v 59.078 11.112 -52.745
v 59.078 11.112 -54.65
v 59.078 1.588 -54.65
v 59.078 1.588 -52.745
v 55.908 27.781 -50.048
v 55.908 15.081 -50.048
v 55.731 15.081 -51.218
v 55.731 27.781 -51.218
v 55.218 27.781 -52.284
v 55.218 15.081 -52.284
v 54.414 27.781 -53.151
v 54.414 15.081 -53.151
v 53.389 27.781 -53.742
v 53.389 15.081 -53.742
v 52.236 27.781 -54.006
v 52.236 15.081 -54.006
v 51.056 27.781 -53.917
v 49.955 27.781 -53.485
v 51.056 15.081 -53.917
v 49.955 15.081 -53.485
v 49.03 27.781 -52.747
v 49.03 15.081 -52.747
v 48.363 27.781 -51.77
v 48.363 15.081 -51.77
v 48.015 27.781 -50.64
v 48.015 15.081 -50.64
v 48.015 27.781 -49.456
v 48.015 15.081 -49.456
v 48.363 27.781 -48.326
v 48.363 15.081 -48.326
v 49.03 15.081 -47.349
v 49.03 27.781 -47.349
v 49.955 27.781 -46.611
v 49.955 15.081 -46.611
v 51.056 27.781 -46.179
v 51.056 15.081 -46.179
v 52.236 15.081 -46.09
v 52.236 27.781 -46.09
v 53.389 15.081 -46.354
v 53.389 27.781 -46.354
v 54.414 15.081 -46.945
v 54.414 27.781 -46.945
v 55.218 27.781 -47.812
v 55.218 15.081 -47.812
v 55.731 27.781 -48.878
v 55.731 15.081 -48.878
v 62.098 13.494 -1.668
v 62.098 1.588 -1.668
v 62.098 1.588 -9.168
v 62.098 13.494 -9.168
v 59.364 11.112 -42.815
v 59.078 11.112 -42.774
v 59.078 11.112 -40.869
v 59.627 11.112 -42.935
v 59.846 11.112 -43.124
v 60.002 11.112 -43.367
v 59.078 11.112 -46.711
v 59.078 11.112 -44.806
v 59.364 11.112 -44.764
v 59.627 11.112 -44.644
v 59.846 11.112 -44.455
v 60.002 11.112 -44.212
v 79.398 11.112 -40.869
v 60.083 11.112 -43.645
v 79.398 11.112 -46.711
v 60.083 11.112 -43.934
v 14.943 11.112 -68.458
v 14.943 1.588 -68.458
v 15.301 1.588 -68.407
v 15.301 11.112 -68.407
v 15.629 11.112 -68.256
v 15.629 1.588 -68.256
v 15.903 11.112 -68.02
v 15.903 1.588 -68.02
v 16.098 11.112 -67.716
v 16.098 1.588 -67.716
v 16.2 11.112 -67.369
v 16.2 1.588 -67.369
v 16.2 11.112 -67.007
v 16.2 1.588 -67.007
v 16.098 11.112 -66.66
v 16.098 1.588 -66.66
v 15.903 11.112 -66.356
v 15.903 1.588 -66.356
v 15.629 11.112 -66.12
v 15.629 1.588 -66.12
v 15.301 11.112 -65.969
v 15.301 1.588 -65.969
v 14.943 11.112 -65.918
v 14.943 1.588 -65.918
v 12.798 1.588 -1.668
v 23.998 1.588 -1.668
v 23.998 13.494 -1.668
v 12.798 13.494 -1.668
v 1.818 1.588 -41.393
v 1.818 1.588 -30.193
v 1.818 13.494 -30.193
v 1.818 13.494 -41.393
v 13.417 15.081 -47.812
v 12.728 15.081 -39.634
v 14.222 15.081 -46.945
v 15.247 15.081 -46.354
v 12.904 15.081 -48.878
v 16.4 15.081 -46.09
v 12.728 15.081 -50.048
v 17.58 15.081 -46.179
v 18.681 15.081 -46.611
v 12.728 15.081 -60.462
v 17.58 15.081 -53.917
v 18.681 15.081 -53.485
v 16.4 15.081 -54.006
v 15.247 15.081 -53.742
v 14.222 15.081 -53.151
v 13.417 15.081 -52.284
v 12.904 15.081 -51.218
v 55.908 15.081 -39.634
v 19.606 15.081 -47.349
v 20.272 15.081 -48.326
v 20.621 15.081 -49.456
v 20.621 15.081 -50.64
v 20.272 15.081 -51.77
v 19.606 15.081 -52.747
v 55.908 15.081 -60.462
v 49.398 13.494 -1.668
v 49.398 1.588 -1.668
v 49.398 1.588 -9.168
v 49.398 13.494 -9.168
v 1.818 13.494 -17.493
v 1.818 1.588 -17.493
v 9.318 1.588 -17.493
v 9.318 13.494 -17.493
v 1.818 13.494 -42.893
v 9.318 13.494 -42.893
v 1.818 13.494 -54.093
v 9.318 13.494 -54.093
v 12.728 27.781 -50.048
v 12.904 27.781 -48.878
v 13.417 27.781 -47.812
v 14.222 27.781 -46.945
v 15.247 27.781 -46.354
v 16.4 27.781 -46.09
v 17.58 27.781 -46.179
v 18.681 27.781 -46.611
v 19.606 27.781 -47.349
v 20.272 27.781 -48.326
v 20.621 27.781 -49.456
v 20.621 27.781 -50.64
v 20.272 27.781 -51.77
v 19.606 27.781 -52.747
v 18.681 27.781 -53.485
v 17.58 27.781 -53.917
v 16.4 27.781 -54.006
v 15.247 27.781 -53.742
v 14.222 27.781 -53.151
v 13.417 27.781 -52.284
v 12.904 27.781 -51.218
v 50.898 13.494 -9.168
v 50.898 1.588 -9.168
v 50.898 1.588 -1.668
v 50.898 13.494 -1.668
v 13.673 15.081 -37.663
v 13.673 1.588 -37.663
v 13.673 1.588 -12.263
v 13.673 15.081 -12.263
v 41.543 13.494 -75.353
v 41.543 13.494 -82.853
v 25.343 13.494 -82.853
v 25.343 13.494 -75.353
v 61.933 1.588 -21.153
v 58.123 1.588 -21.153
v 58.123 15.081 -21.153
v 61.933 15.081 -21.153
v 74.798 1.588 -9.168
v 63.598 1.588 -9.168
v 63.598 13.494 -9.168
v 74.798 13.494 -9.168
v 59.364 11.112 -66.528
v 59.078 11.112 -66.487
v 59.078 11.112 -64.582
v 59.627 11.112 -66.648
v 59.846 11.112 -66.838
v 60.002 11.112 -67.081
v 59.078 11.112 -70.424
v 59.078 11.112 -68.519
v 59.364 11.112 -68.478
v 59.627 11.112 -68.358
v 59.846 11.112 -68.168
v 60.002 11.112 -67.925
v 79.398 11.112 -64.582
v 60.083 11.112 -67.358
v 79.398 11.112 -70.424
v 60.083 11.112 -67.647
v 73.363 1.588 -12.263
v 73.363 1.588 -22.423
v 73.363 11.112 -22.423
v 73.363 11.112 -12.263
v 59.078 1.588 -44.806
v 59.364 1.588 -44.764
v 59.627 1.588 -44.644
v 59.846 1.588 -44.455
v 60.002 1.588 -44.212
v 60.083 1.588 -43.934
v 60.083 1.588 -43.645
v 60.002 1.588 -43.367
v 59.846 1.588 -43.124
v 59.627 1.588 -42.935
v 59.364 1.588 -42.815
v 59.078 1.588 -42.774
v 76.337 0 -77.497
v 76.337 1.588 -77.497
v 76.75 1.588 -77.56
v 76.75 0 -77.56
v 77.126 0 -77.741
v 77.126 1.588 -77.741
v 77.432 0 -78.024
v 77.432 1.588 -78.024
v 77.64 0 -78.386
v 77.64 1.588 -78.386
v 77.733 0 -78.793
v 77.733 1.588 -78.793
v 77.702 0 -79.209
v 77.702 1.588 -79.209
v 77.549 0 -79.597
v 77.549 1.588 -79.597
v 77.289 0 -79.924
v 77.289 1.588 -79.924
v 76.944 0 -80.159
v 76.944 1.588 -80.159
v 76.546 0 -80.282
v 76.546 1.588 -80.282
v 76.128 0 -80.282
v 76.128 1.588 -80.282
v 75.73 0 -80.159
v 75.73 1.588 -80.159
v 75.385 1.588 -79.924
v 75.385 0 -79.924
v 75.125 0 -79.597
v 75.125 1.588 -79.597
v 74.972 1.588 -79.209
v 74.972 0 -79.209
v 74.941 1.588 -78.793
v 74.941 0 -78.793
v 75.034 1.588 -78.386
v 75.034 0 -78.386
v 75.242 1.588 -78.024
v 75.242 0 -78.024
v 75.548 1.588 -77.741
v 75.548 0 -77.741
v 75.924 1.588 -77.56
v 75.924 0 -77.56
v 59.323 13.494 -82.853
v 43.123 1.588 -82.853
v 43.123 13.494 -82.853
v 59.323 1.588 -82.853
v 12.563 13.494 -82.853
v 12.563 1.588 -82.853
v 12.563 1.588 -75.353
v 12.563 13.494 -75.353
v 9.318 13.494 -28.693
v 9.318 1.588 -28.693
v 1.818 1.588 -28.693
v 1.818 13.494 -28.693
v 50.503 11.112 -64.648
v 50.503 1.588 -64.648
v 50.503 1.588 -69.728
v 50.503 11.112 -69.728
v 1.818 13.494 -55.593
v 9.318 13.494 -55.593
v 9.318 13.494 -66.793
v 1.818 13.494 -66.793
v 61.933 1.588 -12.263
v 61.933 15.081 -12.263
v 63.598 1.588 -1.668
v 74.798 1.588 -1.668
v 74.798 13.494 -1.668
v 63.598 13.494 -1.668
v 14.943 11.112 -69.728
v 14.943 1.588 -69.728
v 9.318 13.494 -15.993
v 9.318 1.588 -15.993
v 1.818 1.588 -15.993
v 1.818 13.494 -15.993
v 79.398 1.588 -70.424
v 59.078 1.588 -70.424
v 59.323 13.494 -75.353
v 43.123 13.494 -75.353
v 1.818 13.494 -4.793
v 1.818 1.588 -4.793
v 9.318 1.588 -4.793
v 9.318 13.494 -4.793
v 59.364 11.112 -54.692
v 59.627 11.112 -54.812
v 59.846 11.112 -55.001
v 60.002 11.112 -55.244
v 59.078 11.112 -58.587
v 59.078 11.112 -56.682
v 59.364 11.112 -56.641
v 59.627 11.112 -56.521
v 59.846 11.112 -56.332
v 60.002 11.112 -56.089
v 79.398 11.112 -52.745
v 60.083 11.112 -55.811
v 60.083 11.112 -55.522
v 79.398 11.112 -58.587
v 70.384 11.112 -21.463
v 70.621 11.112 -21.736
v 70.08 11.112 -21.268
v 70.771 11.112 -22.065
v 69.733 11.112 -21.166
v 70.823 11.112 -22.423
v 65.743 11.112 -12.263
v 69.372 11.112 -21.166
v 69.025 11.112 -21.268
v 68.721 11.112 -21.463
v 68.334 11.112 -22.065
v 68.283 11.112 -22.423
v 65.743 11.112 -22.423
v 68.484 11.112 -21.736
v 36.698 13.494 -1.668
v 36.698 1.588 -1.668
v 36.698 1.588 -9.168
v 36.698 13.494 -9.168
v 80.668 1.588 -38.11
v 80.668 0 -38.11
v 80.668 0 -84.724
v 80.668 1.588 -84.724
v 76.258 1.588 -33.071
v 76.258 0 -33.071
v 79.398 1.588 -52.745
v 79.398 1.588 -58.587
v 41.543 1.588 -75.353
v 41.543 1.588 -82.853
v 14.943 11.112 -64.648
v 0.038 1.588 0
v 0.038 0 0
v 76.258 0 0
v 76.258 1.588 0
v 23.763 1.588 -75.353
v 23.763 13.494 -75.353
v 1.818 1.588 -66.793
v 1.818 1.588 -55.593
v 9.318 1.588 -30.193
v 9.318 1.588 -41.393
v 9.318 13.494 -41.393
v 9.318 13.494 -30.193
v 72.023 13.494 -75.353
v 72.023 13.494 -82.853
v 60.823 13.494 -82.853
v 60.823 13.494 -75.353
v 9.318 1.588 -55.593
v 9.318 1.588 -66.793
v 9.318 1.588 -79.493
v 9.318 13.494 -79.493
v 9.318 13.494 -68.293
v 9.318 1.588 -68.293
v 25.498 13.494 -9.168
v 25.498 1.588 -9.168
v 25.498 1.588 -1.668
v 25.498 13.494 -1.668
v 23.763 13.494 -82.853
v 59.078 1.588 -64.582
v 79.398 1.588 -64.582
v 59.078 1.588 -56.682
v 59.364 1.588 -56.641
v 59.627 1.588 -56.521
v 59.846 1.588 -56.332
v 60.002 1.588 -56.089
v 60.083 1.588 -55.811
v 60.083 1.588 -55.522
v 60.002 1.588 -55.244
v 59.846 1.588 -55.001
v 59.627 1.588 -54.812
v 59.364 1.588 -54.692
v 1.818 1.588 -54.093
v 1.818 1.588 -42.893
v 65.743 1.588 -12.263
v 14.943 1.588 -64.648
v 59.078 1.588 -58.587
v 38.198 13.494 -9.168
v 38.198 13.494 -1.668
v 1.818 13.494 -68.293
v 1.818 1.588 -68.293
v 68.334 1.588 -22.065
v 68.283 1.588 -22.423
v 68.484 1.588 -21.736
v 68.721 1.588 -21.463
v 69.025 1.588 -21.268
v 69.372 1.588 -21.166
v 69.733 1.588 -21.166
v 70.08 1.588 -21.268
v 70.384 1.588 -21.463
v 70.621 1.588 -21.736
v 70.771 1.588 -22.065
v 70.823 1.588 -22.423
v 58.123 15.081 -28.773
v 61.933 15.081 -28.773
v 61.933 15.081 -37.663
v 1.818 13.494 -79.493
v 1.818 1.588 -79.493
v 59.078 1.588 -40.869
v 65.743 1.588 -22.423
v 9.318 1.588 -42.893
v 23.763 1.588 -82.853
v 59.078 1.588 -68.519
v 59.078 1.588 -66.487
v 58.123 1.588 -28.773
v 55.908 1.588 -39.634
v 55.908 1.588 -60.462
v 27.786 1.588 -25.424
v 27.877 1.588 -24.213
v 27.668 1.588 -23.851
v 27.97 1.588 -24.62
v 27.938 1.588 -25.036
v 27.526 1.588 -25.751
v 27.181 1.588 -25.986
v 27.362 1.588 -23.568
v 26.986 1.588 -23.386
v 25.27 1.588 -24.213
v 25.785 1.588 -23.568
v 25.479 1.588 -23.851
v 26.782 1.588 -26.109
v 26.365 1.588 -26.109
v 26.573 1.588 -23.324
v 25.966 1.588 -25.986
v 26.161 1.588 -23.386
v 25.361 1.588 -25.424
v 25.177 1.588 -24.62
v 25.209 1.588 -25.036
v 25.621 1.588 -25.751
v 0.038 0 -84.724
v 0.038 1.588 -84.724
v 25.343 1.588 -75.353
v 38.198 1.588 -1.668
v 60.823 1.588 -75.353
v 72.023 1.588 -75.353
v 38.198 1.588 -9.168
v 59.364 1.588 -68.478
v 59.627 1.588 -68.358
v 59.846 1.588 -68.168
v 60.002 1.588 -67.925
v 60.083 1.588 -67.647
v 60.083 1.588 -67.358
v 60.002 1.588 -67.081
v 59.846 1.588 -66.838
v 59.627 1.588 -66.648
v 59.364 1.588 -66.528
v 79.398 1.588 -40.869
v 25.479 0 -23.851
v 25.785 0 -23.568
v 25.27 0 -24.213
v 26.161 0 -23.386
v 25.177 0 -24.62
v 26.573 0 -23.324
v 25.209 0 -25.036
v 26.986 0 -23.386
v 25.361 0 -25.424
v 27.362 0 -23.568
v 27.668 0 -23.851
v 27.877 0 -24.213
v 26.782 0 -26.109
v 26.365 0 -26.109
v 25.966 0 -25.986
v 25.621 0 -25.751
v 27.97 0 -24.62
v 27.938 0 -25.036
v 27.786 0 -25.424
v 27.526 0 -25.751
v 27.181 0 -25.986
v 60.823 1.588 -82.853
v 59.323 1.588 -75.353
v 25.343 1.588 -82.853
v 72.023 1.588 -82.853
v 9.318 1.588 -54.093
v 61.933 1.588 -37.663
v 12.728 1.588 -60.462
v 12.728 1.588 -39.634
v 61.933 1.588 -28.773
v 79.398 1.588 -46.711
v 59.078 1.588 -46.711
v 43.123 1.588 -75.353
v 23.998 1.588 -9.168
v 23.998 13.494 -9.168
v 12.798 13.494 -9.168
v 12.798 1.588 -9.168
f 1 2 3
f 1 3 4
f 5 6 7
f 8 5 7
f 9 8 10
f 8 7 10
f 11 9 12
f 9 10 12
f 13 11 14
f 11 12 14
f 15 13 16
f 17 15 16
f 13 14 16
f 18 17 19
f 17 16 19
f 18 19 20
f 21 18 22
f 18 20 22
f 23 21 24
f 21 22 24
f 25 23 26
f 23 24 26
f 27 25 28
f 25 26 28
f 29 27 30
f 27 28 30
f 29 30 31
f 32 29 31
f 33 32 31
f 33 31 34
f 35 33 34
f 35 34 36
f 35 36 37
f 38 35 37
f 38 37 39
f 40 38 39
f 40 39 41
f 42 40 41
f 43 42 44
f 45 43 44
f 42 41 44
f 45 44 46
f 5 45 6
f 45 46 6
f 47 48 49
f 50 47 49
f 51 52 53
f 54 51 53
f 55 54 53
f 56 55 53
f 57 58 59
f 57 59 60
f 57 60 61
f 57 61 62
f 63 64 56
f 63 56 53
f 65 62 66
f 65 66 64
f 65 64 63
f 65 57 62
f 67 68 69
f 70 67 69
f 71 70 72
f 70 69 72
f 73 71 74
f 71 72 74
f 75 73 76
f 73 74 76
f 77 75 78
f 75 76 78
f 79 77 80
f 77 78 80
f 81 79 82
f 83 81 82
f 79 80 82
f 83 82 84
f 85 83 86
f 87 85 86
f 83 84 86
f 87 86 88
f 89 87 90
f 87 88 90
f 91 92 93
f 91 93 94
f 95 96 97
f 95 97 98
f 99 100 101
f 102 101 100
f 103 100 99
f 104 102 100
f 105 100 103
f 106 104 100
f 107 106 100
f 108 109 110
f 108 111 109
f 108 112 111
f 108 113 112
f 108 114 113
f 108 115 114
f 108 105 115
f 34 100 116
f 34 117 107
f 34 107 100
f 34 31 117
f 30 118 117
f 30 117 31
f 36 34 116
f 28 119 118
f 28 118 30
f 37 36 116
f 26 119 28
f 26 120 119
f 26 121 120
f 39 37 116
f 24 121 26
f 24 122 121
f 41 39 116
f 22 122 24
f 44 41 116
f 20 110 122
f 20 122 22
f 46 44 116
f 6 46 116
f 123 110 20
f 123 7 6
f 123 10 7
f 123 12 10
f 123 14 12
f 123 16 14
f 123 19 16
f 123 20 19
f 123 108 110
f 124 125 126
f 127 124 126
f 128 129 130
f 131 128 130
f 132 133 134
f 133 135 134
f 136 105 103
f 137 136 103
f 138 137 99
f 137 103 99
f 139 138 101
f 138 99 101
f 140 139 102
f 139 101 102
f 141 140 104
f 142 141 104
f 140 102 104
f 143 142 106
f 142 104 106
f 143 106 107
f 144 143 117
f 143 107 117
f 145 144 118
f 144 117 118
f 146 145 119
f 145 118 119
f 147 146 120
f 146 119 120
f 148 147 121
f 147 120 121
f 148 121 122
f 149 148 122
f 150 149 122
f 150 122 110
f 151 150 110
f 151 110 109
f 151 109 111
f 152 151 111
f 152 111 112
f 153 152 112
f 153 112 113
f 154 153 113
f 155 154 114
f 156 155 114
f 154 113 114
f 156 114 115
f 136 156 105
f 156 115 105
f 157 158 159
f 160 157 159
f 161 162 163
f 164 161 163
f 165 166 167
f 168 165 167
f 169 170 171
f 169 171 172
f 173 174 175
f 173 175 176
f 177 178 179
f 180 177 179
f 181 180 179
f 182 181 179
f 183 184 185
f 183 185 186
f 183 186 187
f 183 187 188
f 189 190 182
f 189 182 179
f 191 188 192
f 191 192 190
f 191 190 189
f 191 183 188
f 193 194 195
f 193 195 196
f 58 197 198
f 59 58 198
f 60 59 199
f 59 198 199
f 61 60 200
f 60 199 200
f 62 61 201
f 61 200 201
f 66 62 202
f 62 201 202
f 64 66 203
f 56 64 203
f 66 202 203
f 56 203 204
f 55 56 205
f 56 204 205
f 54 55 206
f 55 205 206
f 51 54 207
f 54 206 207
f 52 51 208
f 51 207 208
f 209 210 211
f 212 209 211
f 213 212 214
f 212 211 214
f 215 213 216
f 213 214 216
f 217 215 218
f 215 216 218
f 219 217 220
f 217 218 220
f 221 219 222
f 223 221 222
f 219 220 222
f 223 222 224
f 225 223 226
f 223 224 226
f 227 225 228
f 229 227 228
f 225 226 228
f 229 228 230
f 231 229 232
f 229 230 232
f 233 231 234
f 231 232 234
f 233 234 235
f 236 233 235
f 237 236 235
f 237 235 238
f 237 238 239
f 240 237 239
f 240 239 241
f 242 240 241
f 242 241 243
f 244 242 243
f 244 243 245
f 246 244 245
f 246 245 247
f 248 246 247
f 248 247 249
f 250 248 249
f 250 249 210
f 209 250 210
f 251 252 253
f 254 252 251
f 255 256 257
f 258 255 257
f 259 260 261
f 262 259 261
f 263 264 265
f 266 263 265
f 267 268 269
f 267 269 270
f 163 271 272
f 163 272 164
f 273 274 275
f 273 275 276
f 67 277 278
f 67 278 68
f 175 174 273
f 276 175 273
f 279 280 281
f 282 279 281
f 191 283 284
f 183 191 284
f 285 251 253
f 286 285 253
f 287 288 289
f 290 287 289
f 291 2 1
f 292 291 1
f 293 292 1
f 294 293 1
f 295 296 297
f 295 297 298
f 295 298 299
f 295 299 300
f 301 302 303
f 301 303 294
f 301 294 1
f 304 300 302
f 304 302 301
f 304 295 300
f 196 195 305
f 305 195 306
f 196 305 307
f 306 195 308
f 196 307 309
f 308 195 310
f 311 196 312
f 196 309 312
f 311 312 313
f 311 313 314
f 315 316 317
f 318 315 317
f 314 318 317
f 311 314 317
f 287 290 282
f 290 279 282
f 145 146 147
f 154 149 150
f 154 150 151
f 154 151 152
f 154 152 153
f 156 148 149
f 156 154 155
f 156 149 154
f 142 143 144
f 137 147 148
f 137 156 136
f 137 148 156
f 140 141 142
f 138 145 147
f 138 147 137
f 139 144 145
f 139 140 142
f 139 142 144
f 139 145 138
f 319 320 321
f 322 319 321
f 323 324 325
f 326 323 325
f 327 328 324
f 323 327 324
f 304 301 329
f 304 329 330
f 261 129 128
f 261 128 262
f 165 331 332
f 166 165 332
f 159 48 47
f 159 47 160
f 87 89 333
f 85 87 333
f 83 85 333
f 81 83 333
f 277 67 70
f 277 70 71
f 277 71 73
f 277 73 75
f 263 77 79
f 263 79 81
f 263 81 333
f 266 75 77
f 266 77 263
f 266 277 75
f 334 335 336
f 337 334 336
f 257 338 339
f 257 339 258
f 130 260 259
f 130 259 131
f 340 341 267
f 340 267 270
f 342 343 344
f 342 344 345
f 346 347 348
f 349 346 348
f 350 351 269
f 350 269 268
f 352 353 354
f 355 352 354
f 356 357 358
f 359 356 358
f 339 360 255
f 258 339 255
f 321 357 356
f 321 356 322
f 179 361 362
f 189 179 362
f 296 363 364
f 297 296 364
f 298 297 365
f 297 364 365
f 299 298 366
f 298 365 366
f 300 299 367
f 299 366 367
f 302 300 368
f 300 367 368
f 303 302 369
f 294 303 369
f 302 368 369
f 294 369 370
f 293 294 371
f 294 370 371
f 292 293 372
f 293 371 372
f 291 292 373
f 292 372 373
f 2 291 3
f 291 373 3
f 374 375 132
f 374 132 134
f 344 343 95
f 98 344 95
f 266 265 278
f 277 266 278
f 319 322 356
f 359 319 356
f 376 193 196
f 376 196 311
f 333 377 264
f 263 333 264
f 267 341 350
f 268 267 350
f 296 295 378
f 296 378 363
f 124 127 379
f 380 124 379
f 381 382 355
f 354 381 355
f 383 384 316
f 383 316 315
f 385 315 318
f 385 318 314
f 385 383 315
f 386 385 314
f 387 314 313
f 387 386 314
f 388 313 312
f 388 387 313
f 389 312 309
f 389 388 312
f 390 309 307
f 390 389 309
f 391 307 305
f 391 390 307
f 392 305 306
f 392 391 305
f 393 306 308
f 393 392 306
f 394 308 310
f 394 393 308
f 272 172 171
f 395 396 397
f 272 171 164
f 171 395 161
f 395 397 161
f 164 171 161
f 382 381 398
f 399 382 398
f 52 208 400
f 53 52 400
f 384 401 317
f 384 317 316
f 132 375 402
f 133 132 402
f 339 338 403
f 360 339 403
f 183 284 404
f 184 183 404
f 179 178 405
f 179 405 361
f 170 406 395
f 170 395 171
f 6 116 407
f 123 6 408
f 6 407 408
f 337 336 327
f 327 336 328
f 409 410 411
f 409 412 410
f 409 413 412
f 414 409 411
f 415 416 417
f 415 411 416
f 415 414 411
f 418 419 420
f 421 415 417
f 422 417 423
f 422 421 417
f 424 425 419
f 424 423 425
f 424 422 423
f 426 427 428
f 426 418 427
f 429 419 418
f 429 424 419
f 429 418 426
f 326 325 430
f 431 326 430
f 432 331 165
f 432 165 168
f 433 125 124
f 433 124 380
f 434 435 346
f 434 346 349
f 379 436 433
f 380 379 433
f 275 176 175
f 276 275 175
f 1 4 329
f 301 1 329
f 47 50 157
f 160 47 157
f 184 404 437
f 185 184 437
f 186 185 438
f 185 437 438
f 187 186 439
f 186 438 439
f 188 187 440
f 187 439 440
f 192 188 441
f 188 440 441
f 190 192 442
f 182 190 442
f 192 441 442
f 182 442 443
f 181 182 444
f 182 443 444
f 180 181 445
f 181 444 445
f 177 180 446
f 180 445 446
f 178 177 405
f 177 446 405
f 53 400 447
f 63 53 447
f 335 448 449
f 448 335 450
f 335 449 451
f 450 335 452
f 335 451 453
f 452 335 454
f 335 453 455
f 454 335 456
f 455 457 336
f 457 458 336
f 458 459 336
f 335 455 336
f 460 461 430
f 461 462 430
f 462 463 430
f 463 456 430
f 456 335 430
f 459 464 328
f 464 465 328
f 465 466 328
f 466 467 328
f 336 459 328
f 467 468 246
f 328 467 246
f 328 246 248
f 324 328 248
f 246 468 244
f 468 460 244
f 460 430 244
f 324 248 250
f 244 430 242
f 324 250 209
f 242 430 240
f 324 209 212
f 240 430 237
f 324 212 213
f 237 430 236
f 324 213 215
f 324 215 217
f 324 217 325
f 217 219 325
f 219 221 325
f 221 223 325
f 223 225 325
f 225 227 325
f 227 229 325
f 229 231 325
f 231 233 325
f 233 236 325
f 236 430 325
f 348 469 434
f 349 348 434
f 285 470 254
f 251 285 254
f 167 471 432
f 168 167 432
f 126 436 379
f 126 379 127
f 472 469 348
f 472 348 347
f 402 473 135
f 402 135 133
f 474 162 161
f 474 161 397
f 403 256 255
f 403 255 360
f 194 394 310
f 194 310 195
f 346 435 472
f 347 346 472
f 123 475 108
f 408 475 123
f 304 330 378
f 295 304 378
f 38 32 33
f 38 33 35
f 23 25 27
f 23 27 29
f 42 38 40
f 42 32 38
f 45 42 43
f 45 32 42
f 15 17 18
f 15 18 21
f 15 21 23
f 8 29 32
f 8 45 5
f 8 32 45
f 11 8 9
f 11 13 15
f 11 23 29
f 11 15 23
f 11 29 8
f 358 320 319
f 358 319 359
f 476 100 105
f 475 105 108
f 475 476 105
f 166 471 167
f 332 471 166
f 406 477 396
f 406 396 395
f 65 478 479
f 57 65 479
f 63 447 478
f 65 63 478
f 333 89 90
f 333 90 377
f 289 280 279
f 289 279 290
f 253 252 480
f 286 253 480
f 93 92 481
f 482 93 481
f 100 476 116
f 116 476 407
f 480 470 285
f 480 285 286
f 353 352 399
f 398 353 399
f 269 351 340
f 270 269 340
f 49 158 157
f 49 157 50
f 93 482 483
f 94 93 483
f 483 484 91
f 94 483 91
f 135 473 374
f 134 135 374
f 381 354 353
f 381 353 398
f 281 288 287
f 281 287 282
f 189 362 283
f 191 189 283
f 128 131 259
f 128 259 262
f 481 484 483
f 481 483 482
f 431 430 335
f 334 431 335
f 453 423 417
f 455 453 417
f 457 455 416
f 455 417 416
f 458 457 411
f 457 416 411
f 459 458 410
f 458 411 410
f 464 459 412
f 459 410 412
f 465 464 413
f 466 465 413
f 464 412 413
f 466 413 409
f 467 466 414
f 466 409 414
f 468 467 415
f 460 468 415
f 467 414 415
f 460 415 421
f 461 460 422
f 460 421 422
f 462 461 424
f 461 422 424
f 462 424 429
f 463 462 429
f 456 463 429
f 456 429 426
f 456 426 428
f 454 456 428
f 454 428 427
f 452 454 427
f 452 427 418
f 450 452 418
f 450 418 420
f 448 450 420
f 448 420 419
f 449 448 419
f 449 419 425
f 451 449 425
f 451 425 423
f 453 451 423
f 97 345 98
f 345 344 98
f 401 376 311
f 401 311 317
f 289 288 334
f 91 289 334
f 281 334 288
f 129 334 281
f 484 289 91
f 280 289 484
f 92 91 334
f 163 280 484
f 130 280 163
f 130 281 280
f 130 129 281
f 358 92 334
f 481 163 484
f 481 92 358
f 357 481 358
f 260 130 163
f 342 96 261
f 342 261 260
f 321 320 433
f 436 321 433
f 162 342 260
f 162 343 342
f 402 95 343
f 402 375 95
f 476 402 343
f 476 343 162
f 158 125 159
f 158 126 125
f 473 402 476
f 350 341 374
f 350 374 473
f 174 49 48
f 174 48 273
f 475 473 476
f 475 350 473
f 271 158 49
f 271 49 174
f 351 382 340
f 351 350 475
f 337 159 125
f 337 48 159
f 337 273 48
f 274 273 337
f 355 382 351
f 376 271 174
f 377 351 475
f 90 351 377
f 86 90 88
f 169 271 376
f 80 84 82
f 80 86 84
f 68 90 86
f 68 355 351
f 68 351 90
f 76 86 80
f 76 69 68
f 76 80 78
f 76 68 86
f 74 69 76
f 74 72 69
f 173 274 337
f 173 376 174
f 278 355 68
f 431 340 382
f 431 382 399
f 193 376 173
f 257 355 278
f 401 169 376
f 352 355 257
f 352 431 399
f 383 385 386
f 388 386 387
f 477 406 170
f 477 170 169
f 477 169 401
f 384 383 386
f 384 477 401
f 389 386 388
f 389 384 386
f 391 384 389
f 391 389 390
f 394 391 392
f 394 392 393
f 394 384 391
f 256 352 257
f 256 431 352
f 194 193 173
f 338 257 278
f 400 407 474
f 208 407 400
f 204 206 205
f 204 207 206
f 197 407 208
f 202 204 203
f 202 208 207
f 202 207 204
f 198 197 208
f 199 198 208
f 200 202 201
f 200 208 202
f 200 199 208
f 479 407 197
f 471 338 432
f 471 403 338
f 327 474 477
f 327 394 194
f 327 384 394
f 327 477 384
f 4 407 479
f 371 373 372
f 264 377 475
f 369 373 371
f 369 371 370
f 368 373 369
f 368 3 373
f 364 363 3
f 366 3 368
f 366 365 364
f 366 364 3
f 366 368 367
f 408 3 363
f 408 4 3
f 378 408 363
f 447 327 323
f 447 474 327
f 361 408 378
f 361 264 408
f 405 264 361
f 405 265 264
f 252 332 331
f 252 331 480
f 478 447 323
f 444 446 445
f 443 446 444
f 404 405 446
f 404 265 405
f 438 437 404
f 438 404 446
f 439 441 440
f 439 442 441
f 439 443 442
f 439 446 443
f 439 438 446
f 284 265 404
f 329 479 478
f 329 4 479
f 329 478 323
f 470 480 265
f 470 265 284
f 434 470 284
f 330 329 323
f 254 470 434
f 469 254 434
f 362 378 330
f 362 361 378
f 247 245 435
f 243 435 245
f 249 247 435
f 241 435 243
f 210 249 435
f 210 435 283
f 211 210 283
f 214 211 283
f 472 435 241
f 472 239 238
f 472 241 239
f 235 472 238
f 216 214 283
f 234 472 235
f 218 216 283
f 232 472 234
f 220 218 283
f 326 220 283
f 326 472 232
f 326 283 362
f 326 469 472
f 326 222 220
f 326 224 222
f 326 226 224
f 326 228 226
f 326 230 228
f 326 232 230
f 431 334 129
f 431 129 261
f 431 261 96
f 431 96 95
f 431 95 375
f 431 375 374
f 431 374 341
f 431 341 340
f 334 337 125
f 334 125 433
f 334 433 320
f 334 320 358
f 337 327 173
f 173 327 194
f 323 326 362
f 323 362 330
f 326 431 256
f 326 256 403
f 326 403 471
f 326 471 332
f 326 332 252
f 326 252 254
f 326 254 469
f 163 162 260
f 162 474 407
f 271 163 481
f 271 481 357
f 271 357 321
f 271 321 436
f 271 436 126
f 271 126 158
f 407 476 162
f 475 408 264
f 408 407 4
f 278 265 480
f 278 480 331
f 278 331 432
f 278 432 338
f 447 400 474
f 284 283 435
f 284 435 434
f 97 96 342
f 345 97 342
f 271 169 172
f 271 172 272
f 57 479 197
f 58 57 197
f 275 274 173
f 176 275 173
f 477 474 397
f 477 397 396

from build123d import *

# Parameters (mm, degrees)
BOSS_EXTRUDE1_DEPTH = 1.5875
SKETCH2_R           = 1.3999972
CUT_EXTRUDE1_DEPTH  = 117.995510328
BOSS_EXTRUDE2_DEPTH = 11.90625
SKETCH4_W           = 43.17991364
SKETCH4_H           = 20.827958344
BOSS_EXTRUDE3_DEPTH = 13.49375
SKETCH6_R           = 3.96875
BOSS_EXTRUDE4_DEPTH = 12.7
BOSS_EXTRUDE5_DEPTH = 9.525


with BuildPart() as part:
    # Sketch1 → Boss-Extrude1 (new body)
    with BuildSketch(Plane(origin=(0, 0, 0), x_dir=(1, 0, 0), z_dir=(0, 1, 0))):
        Polygon((0.038099924, 84.724030552), (0.038099924, 0), (76.258247483, 0), (76.258247483, 33.070733858), (80.667638664, 38.11002378), (80.667638664, 84.724030552), align=None)
    extrude(amount=BOSS_EXTRUDE1_DEPTH)

    # Sketch2 → Cut-Extrude1 (cut, through all)
    with BuildSketch(Plane(origin=(0, 1.5875, 0), x_dir=(1, 0, 0), z_dir=(0, 1, 0))):
        with Locations((76.336947326, 78.897342205)):
            Circle(SKETCH2_R)
        with Locations((26.573446853, 24.724250551)):
            Circle(SKETCH2_R)
    extrude(amount=-CUT_EXTRUDE1_DEPTH, mode=Mode.SUBTRACT)

    # Sketch3 → Boss-Extrude2 (add)
    with BuildSketch(Plane(origin=(0, 1.5875, 0), x_dir=(1, 0, 0), z_dir=(0, 1, 0))):
        Polygon((60.822778354, 75.352649294), (60.822778354, 81.852636294), (60.822778354, 82.852634294), (72.022755954, 82.852634294), (72.022755954, 81.852636294), (72.022755954, 75.352649294), align=None)
        Polygon((59.322781354, 82.852634294), (59.322781354, 81.852636294), (59.322781354, 75.352649294), (43.122813754, 75.352649294), (43.122813754, 81.852636294), (43.122813754, 82.852634294), align=None)
        Polygon((25.342849314, 75.352649294), (25.342849314, 81.852636294), (25.342849314, 82.852634294), (41.542816914, 82.852634294), (41.542816914, 81.852636294), (41.542816914, 75.352649294), align=None)
        Polygon((63.597672804, 1.668196664), (63.597672804, 2.668194664), (63.597672804, 9.168181664), (74.797650404, 9.168181664), (74.797650404, 2.668194664), (74.797650404, 1.668196664), align=None)
        Polygon((50.897698204, 1.668196664), (50.897698204, 2.668194664), (50.897698204, 9.168181664), (62.097675804, 9.168181664), (62.097675804, 2.668194664), (62.097675804, 1.668196664), align=None)
        Polygon((38.197723604, 1.668196664), (38.197723604, 2.668194664), (38.197723604, 9.168181664), (49.397701204, 9.168181664), (49.397701204, 2.668194664), (49.397701204, 1.668196664), align=None)
        Polygon((36.697726604, 9.168181664), (36.697726604, 2.668194664), (36.697726604, 1.668196664), (25.497749004, 1.668196664), (25.497749004, 2.668194664), (25.497749004, 9.168181664), align=None)
        Polygon((12.797774404, 1.668196664), (12.797774404, 2.668194664), (12.797774404, 9.168181664), (23.997752004, 9.168181664), (23.997752004, 2.668194664), (23.997752004, 1.668196664), align=None)
        Polygon((9.318081364, 4.792990414), (2.818094364, 4.792990414), (1.818096364, 4.792990414), (1.818096364, 15.992968014), (2.818094364, 15.992968014), (9.318081364, 15.992968014), align=None)
        Polygon((1.818096364, 28.692942614), (2.818094364, 28.692942614), (9.318081364, 28.692942614), (9.318081364, 17.492965014), (2.818094364, 17.492965014), (1.818096364, 17.492965014), align=None)
        Polygon((9.318081364, 30.192939614), (2.818094364, 30.192939614), (1.818096364, 30.192939614), (1.818096364, 41.392917214), (2.818094364, 41.392917214), (9.318081364, 41.392917214), align=None)
        Polygon((9.318081364, 42.892914214), (2.818094364, 42.892914214), (1.818096364, 42.892914214), (1.818096364, 54.092891814), (2.818094364, 54.092891814), (9.318081364, 54.092891814), align=None)
        Polygon((1.818096364, 66.792866414), (2.818094364, 66.792866414), (9.318081364, 66.792866414), (9.318081364, 55.592888814), (2.818094364, 55.592888814), (1.818096364, 55.592888814), align=None)
        Polygon((12.562874874, 75.352649294), (12.562874874, 81.852636294), (12.562874874, 82.852634294), (23.762852474, 82.852634294), (23.762852474, 81.852636294), (23.762852474, 75.352649294), align=None)
        Polygon((1.818096364, 79.492841014), (2.818094364, 79.492841014), (9.318081364, 79.492841014), (9.318081364, 68.292863414), (2.818094364, 68.292863414), (1.818096364, 68.292863414), align=None)
    extrude(amount=BOSS_EXTRUDE2_DEPTH)

    # Sketch4 → Boss-Extrude3 (add)
    with BuildSketch(Plane(origin=(0, 1.5875, 0), x_dir=(1, 0, 0), z_dir=(0, 1, 0))):
        with Locations((34.317831364, 50.047999904)):
            Rectangle(SKETCH4_W, SKETCH4_H)
        Polygon((13.672772654, 17.343065314), (13.672772654, 32.583034834), (13.672772654, 37.663024674), (61.932676134, 37.663024674), (61.932676134, 28.773042454), (58.122683754, 28.773042454), (58.122683754, 21.153057694), (61.932676134, 21.153057694), (61.932676134, 12.263075474), (13.672772654, 12.263075474), align=None)
    extrude(amount=BOSS_EXTRUDE3_DEPTH)

    # Sketch6 → Boss-Extrude4 (add)
    with BuildSketch(Plane(origin=(0, 15.08125, 0), x_dir=(1, 0, 0), z_dir=(0, 1, 0))):
        with Locations((16.696624544, 50.047999904)):
            Circle(SKETCH6_R)
        with Locations((51.939038184, 50.047999904)):
            Circle(SKETCH6_R)
    extrude(amount=BOSS_EXTRUDE4_DEPTH)

    # Sketch7 → Boss-Extrude5 (add)
    with BuildSketch(Plane(origin=(0, 1.5875, 0), x_dir=(1, 0, 0), z_dir=(0, 1, 0))):
        with BuildLine():
            Line((73.362653274, 22.423055154), (73.362653274, 12.263075474))
            Line((73.362653274, 12.263075474), (65.742668514, 12.263075474))
            Line((65.742668514, 12.263075474), (65.742668514, 22.423055154))
            Line((65.742668514, 22.423055154), (68.282663434, 22.423055154))
            ThreePointArc((68.282663434, 22.423055154), (69.552660894, 21.153057694), (70.822658354, 22.423055154))
            Line((70.822658354, 22.423055154), (73.362653274, 22.423055154))
        make_face()
        with BuildLine():
            Line((79.397641204, 46.710506579), (59.077681844, 46.710506579))
            Line((59.077681844, 46.710506579), (59.077681844, 44.805510389))
            ThreePointArc((59.077681844, 44.805510389), (60.093679812, 43.789512421), (59.077681844, 42.773514453))
            Line((59.077681844, 42.773514453), (59.077681844, 40.868518263))
            Line((59.077681844, 40.868518263), (79.397641204, 40.868518263))
            Line((79.397641204, 40.868518263), (79.397641204, 46.710506579))
        make_face()
        with BuildLine():
            Line((79.397641204, 58.587482825), (59.077681844, 58.587482825))
            Line((59.077681844, 58.587482825), (59.077681844, 56.682486635))
            ThreePointArc((59.077681844, 56.682486635), (60.093679812, 55.666488667), (59.077681844, 54.650490699))
            Line((59.077681844, 54.650490699), (59.077681844, 52.745494509))
            Line((59.077681844, 52.745494509), (79.397641204, 52.745494509))
            Line((79.397641204, 52.745494509), (79.397641204, 58.587482825))
        make_face()
        with BuildLine():
            Line((79.397641204, 70.423859152), (59.077681844, 70.423859152))
            Line((59.077681844, 70.423859152), (59.077681844, 68.518862962))
            ThreePointArc((59.077681844, 68.518862962), (60.093679812, 67.502864994), (59.077681844, 66.486867026))
            Line((59.077681844, 66.486867026), (59.077681844, 64.581870836))
            Line((59.077681844, 64.581870836), (79.397641204, 64.581870836))
            Line((79.397641204, 64.581870836), (79.397641204, 70.423859152))
        make_face()
        with BuildLine():
            Line((14.942770114, 65.917968164), (14.942770114, 64.647970704))
            Line((14.942770114, 64.647970704), (15.06976986, 64.647970704))
            Line((15.06976986, 64.647970704), (50.502698994, 64.647970704))
            Line((50.502698994, 64.647970704), (50.502698994, 69.727960544))
            Line((50.502698994, 69.727960544), (14.942770114, 69.727960544))
            Line((14.942770114, 69.727960544), (14.942770114, 68.457963084))
            ThreePointArc((14.942770114, 68.457963084), (16.212767574, 67.187965624), (14.942770114, 65.917968164))
        make_face()
    extrude(amount=BOSS_EXTRUDE5_DEPTH)


solid = part.part
